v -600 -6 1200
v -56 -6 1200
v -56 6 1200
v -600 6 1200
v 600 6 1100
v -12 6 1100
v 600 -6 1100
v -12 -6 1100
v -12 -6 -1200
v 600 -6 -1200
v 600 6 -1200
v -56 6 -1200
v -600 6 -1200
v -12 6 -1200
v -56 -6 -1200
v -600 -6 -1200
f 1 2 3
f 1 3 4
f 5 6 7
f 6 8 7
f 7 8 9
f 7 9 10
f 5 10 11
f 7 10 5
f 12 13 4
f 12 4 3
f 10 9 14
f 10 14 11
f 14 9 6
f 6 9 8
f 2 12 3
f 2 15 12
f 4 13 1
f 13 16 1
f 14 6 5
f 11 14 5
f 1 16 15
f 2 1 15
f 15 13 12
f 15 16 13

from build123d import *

# Parameters (mm, degrees)
F0_W     = 612
F0_H     = 2300
F1_DEPTH = 6
F0_W_2   = 272
F0_H_2   = 2400


with BuildPart() as f1:
    # F0 (on Front) → F1 (new body, symmetric)
    with BuildSketch(Plane.XZ):
        with Locations((294, -50)):
            Rectangle(F0_W, F0_H)
    extrude(amount=F1_DEPTH, both=True)


with BuildPart() as f1b:
    # F0 (on Front) → F1, piece 2 (new body, symmetric)
    with BuildSketch(Plane.XZ):
        with Locations((-192, 0)):
            Rectangle(F0_W_2, F0_H_2)
        with Locations((-464, 0)):
            Rectangle(F0_W_2, F0_H_2)
    extrude(amount=F1_DEPTH, both=True)


solid = Compound([f1.part, f1b.part])
